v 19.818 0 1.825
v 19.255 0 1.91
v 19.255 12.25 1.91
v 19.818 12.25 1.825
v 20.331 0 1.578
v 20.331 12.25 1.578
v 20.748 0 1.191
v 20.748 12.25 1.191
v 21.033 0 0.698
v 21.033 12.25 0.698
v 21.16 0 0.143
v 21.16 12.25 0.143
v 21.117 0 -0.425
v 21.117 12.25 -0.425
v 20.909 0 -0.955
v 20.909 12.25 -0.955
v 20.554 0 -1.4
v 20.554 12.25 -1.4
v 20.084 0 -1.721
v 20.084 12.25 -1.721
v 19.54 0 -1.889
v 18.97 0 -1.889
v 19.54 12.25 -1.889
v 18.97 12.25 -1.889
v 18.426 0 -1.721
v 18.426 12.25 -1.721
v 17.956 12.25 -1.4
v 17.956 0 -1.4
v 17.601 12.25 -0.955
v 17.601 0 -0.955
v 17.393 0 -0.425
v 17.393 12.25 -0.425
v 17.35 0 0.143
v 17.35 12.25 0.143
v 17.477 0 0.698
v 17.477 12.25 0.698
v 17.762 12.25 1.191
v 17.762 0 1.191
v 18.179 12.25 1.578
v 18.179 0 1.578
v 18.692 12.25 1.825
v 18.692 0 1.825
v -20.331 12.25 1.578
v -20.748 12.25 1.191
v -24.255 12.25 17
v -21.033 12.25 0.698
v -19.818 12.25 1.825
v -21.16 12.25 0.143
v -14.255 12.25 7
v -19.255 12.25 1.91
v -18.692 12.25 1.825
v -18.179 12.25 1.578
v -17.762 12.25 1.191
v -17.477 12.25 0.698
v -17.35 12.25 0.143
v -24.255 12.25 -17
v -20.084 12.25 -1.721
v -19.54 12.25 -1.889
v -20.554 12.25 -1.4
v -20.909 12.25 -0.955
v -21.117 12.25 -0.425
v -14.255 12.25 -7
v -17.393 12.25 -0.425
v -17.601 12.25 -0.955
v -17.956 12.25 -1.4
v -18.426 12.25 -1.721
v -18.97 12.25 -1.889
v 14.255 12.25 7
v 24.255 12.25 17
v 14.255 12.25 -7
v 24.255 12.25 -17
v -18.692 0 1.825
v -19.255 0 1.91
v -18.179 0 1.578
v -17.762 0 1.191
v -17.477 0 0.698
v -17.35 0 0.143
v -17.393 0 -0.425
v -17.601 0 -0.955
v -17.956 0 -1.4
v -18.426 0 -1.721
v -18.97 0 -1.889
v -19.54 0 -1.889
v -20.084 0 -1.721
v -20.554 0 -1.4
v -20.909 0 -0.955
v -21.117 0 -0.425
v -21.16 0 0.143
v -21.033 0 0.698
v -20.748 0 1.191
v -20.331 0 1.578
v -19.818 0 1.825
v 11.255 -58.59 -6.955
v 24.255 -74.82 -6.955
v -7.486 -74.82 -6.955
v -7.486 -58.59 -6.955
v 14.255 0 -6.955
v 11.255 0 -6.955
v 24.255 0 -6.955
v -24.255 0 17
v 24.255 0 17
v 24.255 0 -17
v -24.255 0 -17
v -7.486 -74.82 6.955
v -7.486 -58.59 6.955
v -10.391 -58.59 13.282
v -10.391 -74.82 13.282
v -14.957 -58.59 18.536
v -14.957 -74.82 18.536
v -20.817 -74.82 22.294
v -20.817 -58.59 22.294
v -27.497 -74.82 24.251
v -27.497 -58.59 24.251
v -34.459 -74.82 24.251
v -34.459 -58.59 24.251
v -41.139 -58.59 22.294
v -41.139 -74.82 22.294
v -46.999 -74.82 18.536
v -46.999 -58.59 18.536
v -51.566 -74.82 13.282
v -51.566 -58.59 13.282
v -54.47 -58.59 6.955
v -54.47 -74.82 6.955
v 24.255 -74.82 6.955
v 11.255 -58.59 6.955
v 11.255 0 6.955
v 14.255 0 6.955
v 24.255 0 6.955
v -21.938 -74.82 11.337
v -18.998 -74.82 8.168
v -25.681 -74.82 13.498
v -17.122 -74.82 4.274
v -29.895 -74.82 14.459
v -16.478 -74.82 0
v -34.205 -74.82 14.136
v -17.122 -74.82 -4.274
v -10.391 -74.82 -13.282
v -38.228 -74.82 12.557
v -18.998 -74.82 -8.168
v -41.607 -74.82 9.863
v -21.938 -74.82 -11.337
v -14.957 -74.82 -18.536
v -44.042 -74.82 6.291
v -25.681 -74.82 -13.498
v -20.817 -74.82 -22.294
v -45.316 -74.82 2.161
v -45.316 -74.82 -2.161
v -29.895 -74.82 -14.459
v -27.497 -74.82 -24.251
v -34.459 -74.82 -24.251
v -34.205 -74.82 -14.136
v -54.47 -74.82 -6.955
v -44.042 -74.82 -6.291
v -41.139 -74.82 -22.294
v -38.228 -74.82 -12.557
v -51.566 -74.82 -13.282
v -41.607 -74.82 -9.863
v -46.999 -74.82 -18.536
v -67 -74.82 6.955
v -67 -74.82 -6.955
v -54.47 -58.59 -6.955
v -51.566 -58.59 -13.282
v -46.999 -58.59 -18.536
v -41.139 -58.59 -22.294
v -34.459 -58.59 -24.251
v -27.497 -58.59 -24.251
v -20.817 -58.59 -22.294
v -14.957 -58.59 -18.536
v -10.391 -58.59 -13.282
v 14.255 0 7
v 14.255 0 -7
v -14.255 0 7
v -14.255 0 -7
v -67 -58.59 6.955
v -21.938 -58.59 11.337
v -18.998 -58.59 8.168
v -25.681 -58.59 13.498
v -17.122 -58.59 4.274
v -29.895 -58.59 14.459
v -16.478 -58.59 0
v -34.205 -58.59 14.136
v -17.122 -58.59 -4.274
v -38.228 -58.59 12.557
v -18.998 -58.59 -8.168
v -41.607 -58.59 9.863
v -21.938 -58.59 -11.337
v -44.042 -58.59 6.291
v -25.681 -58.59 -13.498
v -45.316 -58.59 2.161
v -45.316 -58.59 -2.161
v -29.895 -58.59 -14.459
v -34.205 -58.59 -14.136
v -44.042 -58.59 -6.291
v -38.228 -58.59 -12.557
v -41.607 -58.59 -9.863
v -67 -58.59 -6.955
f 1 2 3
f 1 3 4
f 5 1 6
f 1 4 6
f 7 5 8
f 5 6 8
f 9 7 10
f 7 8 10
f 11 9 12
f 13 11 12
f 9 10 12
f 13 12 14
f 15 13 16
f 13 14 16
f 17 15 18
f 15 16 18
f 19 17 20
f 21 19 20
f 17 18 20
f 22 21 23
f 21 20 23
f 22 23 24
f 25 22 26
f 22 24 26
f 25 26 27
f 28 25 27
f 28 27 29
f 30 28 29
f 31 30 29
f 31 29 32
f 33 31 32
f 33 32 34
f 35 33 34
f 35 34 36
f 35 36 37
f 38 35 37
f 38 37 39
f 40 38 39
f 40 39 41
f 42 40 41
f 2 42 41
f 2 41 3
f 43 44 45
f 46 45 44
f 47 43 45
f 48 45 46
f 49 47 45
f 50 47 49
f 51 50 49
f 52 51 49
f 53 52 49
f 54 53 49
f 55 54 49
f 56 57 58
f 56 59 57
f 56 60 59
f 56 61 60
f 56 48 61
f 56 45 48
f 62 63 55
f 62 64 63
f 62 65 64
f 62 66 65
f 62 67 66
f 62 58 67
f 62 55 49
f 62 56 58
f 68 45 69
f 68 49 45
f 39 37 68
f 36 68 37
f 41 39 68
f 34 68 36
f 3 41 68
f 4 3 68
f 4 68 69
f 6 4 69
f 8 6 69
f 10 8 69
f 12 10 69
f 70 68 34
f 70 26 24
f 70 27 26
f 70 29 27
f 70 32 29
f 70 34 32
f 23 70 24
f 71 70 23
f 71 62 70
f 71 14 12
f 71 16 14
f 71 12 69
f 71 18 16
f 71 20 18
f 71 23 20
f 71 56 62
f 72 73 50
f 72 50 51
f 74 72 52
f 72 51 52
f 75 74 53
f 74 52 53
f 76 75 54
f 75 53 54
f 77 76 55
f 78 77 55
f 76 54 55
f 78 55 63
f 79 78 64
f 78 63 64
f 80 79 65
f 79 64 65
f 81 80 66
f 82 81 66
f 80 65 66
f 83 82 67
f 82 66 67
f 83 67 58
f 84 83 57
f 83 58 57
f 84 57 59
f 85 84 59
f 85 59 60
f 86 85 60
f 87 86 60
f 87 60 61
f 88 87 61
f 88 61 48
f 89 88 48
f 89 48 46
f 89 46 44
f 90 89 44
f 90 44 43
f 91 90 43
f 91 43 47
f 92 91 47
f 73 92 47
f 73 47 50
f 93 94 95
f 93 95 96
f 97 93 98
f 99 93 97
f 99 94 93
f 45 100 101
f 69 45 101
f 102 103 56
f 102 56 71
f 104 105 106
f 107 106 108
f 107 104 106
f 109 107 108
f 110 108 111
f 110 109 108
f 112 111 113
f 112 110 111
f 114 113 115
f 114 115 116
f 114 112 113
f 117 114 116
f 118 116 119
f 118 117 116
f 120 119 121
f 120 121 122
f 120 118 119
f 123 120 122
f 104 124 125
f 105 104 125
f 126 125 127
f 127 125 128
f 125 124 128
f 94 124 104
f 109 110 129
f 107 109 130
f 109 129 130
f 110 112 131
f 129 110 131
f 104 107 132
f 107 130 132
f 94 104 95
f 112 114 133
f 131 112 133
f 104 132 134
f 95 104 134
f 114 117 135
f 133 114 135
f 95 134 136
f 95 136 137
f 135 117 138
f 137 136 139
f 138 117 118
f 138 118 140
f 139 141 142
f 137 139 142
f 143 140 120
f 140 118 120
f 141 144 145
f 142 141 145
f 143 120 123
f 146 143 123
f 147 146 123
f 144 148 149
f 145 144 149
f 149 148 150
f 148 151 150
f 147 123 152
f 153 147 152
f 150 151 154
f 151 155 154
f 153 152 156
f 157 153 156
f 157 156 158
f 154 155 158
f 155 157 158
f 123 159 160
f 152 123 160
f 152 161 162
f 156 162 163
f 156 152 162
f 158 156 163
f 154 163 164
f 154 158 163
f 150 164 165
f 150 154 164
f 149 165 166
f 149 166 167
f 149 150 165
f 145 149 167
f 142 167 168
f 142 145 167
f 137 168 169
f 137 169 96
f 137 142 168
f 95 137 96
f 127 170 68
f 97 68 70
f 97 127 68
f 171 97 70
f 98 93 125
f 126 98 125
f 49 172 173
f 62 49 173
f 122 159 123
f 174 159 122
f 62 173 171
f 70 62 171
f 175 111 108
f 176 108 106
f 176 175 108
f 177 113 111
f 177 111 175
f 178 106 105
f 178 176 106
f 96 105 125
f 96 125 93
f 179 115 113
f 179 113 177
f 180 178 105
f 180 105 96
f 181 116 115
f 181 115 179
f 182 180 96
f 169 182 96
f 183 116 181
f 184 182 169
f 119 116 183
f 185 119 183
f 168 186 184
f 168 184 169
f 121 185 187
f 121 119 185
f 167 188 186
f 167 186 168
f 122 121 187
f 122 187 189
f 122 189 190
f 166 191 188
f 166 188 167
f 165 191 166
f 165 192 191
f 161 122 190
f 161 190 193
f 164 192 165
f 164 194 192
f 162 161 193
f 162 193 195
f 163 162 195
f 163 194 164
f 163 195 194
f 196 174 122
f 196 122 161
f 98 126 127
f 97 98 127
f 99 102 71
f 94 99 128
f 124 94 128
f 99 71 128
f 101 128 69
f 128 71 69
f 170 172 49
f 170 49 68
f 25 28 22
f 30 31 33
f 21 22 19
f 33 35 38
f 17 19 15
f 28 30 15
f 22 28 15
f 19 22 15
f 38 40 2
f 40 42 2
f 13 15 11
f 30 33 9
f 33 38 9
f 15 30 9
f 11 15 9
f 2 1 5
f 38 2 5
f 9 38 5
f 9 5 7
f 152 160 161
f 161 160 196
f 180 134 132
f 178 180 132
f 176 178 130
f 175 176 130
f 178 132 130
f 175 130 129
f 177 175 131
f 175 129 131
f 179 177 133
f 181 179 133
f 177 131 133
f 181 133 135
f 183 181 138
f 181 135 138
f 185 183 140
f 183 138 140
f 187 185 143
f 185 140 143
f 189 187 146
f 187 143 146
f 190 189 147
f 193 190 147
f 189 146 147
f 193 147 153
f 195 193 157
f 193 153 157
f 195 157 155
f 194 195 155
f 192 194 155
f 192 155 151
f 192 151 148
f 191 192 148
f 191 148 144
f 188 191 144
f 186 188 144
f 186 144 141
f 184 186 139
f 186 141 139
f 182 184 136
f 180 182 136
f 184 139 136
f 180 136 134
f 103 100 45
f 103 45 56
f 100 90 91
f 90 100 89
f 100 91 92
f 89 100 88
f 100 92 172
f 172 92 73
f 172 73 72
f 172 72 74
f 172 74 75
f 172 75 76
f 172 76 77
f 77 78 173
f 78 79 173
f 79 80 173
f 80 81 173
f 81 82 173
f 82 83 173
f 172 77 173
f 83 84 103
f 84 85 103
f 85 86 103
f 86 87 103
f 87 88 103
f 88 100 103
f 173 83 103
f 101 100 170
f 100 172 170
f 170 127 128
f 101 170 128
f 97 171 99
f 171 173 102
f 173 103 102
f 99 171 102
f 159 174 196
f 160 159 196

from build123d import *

# Parameters (mm, degrees)
SKETCH_1_W           = 48.51
SKETCH_1_H           = 34
SKETCH_1_W_2         = 28.51
SKETCH_1_H_2         = 14
EXTRUDE_1_DEPTH      = 12.25
SKETCH_2_R           = 1.91
CUT_EXTRUDE_1_DEPTH  = 33.05257439
SKETCH_4_W           = 13
SKETCH_4_H           = 13.91
EXTRUDE_1_2_DEPTH    = 74.82
SKETCH_5_W           = 13.91
SKETCH_5_H           = 16.23
EXTRUDE_2_DEPTH      = 23.57
SKETCH_7_R           = 24.5
SKETCH_7_R_2         = 14.5
EXTRUDE_2_2_DEPTH    = 16.23
EXTRUDE_3_DEPTH      = 13.15
EXTRUDE_3_DEPTH_BACK = 7
SKETCH_9_W           = 13.91
SKETCH_9_H           = 16.23


with BuildPart() as part:
    # 草圖1 → Extrude 1 (new body)
    with BuildSketch(Plane(origin=(0, 0, 0), x_dir=(1, 0, 0), z_dir=(0, 1, 0))):
        Rectangle(SKETCH_1_W, SKETCH_1_H)
        Rectangle(SKETCH_1_W_2, SKETCH_1_H_2, mode=Mode.SUBTRACT)
    extrude(amount=EXTRUDE_1_DEPTH)

    # 草圖2 → 除料-伸長1 (cut, through all)
    with BuildSketch(Plane(origin=(0, 12.25, 0), x_dir=(1, 0, 0), z_dir=(0, 1, 0))):
        with Locations(Location((-19.255, 0, 0), (0, 0, 270))):
            Circle(SKETCH_2_R)
        with Locations(Location((19.255, 0, 0), (0, 0, 270))):
            Circle(SKETCH_2_R)
    extrude(amount=-CUT_EXTRUDE_1_DEPTH, mode=Mode.SUBTRACT)

    # 草圖4 → Extrude 1 2 (add)
    with BuildSketch(Plane.XZ):
        with Locations((17.755, 0)):
            Rectangle(SKETCH_4_W, SKETCH_4_H)
    extrude(amount=EXTRUDE_1_2_DEPTH)

    # 草圖5 → Extrude 2 (add)
    with BuildSketch(Plane.ZY.offset(-11.255)):
        with Locations((0, -66.705)):
            Rectangle(SKETCH_5_W, SKETCH_5_H)
    extrude(amount=EXTRUDE_2_DEPTH)

    # 草圖7 → Extrude 2 2 (add)
    with BuildSketch(Plane.XZ.offset(74.82)):
        with Locations((-30.978154344, 0)):
            Circle(SKETCH_7_R)
        with Locations((-30.978154344, 0)):
            Circle(SKETCH_7_R_2, mode=Mode.SUBTRACT)
    extrude(amount=-EXTRUDE_2_2_DEPTH)

    # 草圖9 → 填料-伸長3 (add, two sides: drawn at the far end of the back side and taken through both)
    with BuildSketch(Plane(origin=(-60, 0, 0), x_dir=(0, 0, -1), z_dir=(1, 0, 0)).offset(-EXTRUDE_3_DEPTH_BACK)):
        with Locations((0, -66.705)):
            Rectangle(SKETCH_9_W, SKETCH_9_H)
    extrude(amount=EXTRUDE_3_DEPTH + EXTRUDE_3_DEPTH_BACK)


solid = part.part
